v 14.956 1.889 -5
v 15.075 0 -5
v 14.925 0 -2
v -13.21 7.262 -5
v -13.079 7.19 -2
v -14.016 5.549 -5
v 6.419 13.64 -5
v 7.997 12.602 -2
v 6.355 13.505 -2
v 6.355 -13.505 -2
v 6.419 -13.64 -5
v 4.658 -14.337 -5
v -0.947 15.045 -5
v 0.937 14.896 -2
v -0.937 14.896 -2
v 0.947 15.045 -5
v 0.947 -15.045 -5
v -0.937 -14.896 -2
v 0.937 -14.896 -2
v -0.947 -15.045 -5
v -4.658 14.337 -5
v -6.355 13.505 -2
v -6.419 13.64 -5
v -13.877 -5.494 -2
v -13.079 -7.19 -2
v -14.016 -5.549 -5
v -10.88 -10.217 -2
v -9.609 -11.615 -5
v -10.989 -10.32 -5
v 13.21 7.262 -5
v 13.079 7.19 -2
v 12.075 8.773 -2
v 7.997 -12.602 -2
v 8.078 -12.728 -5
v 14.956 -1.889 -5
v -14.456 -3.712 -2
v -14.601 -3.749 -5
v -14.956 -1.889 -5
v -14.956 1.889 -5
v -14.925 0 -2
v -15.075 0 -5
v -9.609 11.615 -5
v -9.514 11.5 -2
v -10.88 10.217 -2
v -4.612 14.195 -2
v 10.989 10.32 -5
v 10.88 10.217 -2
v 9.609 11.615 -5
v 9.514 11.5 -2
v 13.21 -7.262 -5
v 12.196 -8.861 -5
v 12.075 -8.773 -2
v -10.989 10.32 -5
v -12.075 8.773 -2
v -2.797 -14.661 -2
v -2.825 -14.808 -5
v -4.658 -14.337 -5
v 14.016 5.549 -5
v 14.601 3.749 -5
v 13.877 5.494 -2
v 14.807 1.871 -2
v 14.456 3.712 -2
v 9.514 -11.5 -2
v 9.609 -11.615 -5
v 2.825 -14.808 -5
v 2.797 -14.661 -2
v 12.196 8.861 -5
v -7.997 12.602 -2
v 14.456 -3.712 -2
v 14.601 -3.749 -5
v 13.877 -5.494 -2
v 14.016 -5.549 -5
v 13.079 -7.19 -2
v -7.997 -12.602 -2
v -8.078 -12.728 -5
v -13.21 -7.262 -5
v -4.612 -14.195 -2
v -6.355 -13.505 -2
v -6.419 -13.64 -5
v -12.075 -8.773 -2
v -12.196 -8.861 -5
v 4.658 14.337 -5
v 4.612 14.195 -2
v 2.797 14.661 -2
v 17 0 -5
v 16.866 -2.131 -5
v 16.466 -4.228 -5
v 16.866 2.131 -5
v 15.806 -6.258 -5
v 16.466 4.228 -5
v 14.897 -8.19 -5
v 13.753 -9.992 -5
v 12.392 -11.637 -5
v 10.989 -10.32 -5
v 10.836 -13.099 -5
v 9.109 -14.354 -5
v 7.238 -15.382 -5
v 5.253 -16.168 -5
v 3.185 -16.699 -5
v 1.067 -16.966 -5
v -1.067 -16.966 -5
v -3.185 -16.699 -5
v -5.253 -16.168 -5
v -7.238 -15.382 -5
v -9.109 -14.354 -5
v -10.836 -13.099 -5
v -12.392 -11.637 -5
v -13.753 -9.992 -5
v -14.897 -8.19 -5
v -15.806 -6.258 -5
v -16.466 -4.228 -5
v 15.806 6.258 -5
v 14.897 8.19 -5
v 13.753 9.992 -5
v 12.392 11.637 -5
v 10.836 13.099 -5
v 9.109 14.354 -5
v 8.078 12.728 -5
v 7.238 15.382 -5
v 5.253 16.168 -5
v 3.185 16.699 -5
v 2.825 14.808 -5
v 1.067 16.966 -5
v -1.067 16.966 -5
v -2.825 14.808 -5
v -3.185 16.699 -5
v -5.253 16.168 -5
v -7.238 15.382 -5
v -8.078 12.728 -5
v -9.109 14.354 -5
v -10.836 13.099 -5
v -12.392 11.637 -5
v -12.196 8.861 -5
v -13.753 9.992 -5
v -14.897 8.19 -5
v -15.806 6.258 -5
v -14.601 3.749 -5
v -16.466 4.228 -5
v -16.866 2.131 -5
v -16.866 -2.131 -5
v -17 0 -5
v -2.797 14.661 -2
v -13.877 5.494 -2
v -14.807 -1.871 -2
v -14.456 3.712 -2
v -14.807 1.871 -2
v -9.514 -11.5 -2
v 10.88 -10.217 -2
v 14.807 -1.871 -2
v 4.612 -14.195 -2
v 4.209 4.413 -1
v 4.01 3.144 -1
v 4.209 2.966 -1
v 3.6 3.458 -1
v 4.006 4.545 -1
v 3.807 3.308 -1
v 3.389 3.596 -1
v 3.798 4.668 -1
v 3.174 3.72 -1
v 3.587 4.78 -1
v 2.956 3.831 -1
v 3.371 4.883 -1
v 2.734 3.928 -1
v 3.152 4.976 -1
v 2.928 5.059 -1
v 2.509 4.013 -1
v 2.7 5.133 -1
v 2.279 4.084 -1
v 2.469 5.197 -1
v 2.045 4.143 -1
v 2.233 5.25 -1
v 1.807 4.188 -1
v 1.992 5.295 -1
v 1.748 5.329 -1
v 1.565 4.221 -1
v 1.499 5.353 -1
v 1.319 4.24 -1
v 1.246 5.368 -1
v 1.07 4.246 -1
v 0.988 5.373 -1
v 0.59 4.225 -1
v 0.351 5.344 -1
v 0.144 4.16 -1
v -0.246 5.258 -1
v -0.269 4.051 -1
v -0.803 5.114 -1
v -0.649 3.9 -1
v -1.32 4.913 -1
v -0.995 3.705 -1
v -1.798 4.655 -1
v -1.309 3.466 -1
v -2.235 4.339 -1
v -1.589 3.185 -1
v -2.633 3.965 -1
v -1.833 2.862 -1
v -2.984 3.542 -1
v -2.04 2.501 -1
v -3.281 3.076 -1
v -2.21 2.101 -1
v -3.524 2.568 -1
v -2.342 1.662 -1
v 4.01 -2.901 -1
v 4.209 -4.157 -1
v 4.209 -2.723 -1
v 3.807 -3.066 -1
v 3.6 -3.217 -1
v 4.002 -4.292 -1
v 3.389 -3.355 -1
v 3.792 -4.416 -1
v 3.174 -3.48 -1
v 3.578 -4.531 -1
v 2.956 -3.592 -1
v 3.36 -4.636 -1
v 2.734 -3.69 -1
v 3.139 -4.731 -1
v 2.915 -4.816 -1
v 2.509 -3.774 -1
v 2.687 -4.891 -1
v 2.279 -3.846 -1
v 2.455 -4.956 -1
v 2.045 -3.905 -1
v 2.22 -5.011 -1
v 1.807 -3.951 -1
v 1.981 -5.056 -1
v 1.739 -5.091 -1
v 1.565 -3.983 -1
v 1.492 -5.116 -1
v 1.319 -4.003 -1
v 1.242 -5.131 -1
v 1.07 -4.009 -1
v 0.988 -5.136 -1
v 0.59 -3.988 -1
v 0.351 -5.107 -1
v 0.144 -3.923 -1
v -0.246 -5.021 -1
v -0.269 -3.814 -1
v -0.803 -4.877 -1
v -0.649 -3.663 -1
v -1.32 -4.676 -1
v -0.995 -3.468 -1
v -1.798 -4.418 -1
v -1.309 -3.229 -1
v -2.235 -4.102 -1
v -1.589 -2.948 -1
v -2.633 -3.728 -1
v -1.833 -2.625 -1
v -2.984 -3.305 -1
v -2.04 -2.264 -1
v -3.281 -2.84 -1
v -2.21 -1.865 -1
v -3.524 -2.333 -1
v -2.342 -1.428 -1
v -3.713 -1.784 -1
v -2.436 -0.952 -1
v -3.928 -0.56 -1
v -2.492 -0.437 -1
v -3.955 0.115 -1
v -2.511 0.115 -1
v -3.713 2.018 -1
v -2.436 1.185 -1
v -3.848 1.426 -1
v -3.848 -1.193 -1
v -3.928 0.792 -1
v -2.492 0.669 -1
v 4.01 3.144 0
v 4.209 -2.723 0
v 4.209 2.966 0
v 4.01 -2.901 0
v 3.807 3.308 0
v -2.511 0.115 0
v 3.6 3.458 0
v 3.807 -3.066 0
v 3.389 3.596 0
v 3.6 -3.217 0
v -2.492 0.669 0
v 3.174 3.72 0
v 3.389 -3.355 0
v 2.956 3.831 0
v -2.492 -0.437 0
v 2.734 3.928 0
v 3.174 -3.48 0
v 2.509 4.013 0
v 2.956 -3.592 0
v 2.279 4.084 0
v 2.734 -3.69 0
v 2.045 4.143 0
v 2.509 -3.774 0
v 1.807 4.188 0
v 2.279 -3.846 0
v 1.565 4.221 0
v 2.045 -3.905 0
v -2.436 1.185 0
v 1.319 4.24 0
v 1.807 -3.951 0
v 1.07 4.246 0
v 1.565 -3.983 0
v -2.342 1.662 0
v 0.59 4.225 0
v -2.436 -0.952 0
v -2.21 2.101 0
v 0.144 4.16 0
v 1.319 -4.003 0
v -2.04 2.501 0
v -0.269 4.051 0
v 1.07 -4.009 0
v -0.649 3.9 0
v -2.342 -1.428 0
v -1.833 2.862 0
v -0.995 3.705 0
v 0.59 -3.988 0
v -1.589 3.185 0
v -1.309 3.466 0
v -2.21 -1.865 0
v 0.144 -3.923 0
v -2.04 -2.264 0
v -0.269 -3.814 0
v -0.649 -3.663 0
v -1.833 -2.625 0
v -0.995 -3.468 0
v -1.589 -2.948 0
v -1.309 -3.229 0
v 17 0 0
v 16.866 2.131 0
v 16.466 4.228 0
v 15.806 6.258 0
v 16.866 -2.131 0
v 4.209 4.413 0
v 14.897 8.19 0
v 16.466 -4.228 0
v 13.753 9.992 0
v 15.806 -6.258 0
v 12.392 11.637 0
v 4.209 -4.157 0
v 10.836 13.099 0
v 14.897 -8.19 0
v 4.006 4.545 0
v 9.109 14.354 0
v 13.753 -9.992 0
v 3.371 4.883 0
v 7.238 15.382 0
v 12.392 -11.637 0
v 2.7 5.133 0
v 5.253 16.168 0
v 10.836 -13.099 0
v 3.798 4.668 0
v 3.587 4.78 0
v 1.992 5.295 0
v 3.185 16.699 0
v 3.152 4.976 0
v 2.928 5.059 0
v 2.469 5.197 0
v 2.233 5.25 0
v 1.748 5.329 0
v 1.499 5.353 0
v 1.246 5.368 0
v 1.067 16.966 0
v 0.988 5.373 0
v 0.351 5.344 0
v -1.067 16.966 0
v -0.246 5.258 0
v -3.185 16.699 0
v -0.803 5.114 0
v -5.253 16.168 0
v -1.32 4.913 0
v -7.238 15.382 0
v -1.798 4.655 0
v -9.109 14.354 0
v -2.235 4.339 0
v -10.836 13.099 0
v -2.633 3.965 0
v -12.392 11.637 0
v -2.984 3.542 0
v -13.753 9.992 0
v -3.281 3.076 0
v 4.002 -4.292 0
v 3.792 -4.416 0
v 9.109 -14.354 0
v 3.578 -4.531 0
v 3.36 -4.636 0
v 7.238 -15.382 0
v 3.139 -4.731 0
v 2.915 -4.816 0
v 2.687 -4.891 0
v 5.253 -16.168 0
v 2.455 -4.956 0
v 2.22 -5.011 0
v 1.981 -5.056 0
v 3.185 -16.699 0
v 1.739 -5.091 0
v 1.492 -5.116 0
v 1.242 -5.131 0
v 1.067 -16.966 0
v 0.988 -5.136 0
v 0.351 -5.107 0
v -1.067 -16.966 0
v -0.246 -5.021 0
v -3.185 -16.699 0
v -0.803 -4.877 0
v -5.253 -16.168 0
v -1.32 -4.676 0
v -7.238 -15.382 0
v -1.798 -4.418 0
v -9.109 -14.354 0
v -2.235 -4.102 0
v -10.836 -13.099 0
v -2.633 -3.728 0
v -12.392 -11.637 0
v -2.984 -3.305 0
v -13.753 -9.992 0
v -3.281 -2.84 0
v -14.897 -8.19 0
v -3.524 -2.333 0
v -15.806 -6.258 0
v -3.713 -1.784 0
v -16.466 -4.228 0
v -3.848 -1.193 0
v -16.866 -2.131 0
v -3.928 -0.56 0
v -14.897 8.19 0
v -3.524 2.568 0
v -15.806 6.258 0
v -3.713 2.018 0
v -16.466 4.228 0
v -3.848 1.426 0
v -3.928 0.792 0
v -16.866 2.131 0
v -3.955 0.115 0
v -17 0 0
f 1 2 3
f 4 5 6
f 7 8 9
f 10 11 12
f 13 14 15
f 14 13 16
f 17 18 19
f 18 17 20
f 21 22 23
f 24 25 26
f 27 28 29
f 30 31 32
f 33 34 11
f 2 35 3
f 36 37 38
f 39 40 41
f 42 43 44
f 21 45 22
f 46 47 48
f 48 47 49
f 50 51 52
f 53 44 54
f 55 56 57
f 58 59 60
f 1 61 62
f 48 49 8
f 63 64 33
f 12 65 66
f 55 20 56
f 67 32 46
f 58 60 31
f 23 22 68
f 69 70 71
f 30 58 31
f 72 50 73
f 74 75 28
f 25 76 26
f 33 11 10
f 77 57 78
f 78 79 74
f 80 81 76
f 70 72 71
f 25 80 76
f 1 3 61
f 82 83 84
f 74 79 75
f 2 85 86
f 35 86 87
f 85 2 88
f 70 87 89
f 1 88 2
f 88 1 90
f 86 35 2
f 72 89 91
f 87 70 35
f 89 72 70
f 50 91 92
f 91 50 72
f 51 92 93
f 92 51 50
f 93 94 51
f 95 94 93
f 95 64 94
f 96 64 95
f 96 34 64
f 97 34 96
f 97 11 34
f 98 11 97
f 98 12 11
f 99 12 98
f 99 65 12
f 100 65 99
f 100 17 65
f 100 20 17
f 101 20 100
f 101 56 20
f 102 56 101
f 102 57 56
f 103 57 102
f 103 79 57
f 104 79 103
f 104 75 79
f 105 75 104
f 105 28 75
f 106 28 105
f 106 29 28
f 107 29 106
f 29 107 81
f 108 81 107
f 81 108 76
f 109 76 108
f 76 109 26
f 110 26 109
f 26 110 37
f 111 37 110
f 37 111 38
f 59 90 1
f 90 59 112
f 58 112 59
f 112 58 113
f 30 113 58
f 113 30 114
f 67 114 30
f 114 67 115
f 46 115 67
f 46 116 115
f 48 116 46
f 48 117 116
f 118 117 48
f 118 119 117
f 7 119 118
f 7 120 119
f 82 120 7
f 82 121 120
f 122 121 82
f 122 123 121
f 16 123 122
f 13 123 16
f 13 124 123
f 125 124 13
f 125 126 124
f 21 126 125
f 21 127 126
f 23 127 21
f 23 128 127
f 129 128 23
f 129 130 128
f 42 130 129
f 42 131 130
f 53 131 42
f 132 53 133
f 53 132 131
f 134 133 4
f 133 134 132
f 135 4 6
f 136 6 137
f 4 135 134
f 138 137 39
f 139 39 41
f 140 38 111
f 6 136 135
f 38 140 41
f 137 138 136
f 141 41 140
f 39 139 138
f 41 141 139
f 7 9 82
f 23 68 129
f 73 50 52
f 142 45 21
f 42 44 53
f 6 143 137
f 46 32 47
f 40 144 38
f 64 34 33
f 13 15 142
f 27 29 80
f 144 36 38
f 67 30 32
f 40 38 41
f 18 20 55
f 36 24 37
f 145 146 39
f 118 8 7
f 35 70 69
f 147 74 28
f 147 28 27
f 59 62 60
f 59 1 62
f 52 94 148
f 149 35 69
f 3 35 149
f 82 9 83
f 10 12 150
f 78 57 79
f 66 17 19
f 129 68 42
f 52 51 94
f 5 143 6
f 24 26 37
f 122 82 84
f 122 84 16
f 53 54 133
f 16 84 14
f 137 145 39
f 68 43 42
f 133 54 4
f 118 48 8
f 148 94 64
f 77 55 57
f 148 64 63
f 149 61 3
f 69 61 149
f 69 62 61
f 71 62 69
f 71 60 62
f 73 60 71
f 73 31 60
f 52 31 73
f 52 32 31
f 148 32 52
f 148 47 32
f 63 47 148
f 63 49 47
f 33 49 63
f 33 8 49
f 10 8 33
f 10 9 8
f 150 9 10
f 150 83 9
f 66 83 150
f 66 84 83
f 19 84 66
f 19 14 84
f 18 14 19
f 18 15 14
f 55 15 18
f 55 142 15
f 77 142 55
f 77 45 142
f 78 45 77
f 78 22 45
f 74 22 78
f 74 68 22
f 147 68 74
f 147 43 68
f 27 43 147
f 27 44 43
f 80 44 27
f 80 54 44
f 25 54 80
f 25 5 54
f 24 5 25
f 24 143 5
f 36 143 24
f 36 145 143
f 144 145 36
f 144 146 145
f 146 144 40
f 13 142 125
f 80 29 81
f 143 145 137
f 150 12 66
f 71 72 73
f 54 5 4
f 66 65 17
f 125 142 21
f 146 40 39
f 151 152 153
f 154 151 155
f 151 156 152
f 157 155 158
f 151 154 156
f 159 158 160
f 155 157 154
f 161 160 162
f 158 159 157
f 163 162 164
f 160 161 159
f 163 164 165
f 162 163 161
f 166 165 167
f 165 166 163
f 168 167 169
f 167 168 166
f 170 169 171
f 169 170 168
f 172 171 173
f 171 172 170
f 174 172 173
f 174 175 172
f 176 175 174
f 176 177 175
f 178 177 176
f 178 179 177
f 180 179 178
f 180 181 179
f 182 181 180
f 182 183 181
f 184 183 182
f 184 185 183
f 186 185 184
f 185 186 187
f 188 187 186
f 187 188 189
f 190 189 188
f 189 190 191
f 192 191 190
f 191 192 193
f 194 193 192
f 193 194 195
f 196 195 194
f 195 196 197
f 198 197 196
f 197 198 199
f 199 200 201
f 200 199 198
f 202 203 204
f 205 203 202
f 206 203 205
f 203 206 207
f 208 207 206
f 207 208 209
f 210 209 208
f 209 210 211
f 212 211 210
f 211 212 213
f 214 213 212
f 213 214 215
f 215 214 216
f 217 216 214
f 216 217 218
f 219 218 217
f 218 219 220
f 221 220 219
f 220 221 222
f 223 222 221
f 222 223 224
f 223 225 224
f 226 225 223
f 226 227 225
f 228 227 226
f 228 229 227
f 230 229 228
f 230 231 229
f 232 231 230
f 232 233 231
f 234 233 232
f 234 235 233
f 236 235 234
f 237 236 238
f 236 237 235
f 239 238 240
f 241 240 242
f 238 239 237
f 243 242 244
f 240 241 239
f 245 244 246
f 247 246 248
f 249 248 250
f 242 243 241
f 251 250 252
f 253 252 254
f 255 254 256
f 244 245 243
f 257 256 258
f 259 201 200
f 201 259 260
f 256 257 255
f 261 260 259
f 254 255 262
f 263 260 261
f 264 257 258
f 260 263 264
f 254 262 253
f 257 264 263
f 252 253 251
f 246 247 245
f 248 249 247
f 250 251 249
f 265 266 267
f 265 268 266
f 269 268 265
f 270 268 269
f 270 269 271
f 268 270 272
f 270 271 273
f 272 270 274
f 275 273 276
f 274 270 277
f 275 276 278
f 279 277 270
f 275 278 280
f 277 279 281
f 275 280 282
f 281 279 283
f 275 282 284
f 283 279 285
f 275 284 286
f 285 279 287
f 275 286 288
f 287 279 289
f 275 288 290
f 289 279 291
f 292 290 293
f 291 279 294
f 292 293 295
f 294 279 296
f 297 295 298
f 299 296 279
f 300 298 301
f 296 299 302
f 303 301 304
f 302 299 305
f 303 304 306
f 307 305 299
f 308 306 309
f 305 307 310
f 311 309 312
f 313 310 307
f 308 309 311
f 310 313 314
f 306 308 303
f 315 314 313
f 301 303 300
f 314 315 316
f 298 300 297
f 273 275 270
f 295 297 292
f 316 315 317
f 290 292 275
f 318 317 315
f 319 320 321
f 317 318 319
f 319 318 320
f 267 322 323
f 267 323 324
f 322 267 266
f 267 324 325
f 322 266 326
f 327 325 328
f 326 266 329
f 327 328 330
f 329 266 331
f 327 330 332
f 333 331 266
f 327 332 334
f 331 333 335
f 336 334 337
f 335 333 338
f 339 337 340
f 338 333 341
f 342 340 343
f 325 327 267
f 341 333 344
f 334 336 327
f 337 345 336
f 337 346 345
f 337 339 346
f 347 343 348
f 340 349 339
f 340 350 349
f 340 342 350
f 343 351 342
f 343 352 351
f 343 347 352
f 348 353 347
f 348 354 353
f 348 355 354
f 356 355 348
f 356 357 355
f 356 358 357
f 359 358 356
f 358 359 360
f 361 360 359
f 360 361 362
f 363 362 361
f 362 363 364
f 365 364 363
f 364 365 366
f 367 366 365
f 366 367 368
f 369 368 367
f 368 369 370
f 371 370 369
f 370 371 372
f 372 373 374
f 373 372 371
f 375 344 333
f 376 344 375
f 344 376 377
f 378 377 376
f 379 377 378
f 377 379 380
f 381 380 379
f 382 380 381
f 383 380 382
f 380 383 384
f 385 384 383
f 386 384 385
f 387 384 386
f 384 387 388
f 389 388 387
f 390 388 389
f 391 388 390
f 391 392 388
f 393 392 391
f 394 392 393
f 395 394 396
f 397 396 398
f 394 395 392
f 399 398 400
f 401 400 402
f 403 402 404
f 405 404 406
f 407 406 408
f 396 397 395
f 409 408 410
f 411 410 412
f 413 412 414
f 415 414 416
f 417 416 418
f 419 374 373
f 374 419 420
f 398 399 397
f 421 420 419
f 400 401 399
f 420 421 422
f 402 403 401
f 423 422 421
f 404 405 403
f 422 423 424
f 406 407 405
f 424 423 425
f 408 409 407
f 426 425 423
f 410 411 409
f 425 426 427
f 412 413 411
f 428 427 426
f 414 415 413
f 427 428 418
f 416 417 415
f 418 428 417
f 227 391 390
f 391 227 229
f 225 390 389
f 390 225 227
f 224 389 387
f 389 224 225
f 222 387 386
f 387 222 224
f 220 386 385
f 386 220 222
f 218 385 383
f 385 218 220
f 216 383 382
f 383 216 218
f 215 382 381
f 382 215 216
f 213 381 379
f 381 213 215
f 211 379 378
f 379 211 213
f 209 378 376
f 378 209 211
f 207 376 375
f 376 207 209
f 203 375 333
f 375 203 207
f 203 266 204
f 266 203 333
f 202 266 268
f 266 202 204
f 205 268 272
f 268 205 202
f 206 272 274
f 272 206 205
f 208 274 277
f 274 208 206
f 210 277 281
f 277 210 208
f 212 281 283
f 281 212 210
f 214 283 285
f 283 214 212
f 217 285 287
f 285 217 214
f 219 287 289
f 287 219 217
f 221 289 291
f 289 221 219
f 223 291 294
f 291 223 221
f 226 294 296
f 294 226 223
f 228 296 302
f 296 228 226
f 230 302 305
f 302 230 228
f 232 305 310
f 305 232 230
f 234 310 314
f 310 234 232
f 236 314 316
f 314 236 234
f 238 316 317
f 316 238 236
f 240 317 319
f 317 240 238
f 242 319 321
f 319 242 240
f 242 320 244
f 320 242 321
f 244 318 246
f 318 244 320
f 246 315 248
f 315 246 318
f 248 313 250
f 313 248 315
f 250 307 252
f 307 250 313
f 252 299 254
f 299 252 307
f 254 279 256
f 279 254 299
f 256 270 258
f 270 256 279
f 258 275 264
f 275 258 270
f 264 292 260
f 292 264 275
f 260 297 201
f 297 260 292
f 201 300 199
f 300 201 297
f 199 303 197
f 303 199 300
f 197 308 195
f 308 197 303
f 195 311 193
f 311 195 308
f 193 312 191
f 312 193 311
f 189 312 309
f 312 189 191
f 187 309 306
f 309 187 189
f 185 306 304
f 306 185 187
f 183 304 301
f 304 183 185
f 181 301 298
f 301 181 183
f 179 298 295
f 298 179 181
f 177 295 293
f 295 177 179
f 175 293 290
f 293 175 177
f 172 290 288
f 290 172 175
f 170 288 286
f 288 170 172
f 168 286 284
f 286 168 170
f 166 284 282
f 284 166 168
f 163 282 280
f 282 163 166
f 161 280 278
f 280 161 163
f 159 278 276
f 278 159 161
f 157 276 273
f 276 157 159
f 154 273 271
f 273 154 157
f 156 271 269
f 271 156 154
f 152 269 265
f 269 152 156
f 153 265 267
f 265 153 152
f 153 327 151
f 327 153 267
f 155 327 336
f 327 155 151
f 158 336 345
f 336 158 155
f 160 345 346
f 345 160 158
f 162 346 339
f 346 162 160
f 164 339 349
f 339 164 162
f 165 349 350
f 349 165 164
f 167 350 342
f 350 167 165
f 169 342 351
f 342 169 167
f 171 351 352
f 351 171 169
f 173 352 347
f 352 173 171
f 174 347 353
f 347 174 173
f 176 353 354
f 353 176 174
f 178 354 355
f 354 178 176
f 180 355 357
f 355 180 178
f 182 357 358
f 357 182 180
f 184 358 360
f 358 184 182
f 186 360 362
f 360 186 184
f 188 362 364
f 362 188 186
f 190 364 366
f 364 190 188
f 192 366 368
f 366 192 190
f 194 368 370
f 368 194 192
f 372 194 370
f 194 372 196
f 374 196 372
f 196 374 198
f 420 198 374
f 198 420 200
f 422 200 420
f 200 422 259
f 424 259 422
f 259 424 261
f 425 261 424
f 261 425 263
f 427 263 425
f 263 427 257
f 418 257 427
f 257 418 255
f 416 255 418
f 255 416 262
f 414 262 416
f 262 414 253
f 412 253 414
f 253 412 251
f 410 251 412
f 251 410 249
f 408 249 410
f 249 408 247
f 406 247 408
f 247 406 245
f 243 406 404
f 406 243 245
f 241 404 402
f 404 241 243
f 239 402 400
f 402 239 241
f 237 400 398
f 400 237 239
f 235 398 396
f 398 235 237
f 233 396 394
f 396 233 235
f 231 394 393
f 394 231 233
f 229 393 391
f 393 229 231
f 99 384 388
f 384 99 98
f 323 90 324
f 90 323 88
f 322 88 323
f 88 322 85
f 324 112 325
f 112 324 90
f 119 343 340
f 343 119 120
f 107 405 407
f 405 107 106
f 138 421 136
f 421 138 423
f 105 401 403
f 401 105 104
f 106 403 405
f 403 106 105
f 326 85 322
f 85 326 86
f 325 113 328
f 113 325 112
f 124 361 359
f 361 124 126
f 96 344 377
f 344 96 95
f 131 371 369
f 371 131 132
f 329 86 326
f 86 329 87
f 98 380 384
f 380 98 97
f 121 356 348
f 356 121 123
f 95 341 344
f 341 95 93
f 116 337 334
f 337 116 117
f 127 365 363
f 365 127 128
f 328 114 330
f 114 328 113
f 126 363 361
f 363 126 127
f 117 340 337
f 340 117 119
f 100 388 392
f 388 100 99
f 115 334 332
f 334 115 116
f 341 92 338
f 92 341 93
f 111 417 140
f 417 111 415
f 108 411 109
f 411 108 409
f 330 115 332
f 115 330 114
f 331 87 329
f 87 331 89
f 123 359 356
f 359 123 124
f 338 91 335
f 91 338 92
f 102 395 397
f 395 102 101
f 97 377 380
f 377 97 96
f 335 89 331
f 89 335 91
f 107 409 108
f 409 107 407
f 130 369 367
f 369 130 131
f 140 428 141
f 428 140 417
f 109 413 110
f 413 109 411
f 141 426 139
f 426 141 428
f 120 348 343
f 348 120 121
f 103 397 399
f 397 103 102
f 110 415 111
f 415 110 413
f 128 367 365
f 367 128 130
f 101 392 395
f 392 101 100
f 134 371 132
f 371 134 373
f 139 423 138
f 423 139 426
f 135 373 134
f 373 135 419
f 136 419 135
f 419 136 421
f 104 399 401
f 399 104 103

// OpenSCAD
$fn = 50;


difference() {
	union() {
		translate(v = [0, 0, -5.0000000000]) {
			cylinder(h = 5, r = 17.0000000000);
		}
	}
	union() {
		#translate(v = [0, 0, -5.0000000000]) {
			cylinder(h = 3, r1 = 15.0750000000, r2 = 14.9250000000);
		}
		translate(v = [0, 0, -1]) {
			linear_extrude(height = 1) {
				text(font = "Impact", halign = "center", size = 10, text = "C", valign = "center");
			}
		}
	}
}
